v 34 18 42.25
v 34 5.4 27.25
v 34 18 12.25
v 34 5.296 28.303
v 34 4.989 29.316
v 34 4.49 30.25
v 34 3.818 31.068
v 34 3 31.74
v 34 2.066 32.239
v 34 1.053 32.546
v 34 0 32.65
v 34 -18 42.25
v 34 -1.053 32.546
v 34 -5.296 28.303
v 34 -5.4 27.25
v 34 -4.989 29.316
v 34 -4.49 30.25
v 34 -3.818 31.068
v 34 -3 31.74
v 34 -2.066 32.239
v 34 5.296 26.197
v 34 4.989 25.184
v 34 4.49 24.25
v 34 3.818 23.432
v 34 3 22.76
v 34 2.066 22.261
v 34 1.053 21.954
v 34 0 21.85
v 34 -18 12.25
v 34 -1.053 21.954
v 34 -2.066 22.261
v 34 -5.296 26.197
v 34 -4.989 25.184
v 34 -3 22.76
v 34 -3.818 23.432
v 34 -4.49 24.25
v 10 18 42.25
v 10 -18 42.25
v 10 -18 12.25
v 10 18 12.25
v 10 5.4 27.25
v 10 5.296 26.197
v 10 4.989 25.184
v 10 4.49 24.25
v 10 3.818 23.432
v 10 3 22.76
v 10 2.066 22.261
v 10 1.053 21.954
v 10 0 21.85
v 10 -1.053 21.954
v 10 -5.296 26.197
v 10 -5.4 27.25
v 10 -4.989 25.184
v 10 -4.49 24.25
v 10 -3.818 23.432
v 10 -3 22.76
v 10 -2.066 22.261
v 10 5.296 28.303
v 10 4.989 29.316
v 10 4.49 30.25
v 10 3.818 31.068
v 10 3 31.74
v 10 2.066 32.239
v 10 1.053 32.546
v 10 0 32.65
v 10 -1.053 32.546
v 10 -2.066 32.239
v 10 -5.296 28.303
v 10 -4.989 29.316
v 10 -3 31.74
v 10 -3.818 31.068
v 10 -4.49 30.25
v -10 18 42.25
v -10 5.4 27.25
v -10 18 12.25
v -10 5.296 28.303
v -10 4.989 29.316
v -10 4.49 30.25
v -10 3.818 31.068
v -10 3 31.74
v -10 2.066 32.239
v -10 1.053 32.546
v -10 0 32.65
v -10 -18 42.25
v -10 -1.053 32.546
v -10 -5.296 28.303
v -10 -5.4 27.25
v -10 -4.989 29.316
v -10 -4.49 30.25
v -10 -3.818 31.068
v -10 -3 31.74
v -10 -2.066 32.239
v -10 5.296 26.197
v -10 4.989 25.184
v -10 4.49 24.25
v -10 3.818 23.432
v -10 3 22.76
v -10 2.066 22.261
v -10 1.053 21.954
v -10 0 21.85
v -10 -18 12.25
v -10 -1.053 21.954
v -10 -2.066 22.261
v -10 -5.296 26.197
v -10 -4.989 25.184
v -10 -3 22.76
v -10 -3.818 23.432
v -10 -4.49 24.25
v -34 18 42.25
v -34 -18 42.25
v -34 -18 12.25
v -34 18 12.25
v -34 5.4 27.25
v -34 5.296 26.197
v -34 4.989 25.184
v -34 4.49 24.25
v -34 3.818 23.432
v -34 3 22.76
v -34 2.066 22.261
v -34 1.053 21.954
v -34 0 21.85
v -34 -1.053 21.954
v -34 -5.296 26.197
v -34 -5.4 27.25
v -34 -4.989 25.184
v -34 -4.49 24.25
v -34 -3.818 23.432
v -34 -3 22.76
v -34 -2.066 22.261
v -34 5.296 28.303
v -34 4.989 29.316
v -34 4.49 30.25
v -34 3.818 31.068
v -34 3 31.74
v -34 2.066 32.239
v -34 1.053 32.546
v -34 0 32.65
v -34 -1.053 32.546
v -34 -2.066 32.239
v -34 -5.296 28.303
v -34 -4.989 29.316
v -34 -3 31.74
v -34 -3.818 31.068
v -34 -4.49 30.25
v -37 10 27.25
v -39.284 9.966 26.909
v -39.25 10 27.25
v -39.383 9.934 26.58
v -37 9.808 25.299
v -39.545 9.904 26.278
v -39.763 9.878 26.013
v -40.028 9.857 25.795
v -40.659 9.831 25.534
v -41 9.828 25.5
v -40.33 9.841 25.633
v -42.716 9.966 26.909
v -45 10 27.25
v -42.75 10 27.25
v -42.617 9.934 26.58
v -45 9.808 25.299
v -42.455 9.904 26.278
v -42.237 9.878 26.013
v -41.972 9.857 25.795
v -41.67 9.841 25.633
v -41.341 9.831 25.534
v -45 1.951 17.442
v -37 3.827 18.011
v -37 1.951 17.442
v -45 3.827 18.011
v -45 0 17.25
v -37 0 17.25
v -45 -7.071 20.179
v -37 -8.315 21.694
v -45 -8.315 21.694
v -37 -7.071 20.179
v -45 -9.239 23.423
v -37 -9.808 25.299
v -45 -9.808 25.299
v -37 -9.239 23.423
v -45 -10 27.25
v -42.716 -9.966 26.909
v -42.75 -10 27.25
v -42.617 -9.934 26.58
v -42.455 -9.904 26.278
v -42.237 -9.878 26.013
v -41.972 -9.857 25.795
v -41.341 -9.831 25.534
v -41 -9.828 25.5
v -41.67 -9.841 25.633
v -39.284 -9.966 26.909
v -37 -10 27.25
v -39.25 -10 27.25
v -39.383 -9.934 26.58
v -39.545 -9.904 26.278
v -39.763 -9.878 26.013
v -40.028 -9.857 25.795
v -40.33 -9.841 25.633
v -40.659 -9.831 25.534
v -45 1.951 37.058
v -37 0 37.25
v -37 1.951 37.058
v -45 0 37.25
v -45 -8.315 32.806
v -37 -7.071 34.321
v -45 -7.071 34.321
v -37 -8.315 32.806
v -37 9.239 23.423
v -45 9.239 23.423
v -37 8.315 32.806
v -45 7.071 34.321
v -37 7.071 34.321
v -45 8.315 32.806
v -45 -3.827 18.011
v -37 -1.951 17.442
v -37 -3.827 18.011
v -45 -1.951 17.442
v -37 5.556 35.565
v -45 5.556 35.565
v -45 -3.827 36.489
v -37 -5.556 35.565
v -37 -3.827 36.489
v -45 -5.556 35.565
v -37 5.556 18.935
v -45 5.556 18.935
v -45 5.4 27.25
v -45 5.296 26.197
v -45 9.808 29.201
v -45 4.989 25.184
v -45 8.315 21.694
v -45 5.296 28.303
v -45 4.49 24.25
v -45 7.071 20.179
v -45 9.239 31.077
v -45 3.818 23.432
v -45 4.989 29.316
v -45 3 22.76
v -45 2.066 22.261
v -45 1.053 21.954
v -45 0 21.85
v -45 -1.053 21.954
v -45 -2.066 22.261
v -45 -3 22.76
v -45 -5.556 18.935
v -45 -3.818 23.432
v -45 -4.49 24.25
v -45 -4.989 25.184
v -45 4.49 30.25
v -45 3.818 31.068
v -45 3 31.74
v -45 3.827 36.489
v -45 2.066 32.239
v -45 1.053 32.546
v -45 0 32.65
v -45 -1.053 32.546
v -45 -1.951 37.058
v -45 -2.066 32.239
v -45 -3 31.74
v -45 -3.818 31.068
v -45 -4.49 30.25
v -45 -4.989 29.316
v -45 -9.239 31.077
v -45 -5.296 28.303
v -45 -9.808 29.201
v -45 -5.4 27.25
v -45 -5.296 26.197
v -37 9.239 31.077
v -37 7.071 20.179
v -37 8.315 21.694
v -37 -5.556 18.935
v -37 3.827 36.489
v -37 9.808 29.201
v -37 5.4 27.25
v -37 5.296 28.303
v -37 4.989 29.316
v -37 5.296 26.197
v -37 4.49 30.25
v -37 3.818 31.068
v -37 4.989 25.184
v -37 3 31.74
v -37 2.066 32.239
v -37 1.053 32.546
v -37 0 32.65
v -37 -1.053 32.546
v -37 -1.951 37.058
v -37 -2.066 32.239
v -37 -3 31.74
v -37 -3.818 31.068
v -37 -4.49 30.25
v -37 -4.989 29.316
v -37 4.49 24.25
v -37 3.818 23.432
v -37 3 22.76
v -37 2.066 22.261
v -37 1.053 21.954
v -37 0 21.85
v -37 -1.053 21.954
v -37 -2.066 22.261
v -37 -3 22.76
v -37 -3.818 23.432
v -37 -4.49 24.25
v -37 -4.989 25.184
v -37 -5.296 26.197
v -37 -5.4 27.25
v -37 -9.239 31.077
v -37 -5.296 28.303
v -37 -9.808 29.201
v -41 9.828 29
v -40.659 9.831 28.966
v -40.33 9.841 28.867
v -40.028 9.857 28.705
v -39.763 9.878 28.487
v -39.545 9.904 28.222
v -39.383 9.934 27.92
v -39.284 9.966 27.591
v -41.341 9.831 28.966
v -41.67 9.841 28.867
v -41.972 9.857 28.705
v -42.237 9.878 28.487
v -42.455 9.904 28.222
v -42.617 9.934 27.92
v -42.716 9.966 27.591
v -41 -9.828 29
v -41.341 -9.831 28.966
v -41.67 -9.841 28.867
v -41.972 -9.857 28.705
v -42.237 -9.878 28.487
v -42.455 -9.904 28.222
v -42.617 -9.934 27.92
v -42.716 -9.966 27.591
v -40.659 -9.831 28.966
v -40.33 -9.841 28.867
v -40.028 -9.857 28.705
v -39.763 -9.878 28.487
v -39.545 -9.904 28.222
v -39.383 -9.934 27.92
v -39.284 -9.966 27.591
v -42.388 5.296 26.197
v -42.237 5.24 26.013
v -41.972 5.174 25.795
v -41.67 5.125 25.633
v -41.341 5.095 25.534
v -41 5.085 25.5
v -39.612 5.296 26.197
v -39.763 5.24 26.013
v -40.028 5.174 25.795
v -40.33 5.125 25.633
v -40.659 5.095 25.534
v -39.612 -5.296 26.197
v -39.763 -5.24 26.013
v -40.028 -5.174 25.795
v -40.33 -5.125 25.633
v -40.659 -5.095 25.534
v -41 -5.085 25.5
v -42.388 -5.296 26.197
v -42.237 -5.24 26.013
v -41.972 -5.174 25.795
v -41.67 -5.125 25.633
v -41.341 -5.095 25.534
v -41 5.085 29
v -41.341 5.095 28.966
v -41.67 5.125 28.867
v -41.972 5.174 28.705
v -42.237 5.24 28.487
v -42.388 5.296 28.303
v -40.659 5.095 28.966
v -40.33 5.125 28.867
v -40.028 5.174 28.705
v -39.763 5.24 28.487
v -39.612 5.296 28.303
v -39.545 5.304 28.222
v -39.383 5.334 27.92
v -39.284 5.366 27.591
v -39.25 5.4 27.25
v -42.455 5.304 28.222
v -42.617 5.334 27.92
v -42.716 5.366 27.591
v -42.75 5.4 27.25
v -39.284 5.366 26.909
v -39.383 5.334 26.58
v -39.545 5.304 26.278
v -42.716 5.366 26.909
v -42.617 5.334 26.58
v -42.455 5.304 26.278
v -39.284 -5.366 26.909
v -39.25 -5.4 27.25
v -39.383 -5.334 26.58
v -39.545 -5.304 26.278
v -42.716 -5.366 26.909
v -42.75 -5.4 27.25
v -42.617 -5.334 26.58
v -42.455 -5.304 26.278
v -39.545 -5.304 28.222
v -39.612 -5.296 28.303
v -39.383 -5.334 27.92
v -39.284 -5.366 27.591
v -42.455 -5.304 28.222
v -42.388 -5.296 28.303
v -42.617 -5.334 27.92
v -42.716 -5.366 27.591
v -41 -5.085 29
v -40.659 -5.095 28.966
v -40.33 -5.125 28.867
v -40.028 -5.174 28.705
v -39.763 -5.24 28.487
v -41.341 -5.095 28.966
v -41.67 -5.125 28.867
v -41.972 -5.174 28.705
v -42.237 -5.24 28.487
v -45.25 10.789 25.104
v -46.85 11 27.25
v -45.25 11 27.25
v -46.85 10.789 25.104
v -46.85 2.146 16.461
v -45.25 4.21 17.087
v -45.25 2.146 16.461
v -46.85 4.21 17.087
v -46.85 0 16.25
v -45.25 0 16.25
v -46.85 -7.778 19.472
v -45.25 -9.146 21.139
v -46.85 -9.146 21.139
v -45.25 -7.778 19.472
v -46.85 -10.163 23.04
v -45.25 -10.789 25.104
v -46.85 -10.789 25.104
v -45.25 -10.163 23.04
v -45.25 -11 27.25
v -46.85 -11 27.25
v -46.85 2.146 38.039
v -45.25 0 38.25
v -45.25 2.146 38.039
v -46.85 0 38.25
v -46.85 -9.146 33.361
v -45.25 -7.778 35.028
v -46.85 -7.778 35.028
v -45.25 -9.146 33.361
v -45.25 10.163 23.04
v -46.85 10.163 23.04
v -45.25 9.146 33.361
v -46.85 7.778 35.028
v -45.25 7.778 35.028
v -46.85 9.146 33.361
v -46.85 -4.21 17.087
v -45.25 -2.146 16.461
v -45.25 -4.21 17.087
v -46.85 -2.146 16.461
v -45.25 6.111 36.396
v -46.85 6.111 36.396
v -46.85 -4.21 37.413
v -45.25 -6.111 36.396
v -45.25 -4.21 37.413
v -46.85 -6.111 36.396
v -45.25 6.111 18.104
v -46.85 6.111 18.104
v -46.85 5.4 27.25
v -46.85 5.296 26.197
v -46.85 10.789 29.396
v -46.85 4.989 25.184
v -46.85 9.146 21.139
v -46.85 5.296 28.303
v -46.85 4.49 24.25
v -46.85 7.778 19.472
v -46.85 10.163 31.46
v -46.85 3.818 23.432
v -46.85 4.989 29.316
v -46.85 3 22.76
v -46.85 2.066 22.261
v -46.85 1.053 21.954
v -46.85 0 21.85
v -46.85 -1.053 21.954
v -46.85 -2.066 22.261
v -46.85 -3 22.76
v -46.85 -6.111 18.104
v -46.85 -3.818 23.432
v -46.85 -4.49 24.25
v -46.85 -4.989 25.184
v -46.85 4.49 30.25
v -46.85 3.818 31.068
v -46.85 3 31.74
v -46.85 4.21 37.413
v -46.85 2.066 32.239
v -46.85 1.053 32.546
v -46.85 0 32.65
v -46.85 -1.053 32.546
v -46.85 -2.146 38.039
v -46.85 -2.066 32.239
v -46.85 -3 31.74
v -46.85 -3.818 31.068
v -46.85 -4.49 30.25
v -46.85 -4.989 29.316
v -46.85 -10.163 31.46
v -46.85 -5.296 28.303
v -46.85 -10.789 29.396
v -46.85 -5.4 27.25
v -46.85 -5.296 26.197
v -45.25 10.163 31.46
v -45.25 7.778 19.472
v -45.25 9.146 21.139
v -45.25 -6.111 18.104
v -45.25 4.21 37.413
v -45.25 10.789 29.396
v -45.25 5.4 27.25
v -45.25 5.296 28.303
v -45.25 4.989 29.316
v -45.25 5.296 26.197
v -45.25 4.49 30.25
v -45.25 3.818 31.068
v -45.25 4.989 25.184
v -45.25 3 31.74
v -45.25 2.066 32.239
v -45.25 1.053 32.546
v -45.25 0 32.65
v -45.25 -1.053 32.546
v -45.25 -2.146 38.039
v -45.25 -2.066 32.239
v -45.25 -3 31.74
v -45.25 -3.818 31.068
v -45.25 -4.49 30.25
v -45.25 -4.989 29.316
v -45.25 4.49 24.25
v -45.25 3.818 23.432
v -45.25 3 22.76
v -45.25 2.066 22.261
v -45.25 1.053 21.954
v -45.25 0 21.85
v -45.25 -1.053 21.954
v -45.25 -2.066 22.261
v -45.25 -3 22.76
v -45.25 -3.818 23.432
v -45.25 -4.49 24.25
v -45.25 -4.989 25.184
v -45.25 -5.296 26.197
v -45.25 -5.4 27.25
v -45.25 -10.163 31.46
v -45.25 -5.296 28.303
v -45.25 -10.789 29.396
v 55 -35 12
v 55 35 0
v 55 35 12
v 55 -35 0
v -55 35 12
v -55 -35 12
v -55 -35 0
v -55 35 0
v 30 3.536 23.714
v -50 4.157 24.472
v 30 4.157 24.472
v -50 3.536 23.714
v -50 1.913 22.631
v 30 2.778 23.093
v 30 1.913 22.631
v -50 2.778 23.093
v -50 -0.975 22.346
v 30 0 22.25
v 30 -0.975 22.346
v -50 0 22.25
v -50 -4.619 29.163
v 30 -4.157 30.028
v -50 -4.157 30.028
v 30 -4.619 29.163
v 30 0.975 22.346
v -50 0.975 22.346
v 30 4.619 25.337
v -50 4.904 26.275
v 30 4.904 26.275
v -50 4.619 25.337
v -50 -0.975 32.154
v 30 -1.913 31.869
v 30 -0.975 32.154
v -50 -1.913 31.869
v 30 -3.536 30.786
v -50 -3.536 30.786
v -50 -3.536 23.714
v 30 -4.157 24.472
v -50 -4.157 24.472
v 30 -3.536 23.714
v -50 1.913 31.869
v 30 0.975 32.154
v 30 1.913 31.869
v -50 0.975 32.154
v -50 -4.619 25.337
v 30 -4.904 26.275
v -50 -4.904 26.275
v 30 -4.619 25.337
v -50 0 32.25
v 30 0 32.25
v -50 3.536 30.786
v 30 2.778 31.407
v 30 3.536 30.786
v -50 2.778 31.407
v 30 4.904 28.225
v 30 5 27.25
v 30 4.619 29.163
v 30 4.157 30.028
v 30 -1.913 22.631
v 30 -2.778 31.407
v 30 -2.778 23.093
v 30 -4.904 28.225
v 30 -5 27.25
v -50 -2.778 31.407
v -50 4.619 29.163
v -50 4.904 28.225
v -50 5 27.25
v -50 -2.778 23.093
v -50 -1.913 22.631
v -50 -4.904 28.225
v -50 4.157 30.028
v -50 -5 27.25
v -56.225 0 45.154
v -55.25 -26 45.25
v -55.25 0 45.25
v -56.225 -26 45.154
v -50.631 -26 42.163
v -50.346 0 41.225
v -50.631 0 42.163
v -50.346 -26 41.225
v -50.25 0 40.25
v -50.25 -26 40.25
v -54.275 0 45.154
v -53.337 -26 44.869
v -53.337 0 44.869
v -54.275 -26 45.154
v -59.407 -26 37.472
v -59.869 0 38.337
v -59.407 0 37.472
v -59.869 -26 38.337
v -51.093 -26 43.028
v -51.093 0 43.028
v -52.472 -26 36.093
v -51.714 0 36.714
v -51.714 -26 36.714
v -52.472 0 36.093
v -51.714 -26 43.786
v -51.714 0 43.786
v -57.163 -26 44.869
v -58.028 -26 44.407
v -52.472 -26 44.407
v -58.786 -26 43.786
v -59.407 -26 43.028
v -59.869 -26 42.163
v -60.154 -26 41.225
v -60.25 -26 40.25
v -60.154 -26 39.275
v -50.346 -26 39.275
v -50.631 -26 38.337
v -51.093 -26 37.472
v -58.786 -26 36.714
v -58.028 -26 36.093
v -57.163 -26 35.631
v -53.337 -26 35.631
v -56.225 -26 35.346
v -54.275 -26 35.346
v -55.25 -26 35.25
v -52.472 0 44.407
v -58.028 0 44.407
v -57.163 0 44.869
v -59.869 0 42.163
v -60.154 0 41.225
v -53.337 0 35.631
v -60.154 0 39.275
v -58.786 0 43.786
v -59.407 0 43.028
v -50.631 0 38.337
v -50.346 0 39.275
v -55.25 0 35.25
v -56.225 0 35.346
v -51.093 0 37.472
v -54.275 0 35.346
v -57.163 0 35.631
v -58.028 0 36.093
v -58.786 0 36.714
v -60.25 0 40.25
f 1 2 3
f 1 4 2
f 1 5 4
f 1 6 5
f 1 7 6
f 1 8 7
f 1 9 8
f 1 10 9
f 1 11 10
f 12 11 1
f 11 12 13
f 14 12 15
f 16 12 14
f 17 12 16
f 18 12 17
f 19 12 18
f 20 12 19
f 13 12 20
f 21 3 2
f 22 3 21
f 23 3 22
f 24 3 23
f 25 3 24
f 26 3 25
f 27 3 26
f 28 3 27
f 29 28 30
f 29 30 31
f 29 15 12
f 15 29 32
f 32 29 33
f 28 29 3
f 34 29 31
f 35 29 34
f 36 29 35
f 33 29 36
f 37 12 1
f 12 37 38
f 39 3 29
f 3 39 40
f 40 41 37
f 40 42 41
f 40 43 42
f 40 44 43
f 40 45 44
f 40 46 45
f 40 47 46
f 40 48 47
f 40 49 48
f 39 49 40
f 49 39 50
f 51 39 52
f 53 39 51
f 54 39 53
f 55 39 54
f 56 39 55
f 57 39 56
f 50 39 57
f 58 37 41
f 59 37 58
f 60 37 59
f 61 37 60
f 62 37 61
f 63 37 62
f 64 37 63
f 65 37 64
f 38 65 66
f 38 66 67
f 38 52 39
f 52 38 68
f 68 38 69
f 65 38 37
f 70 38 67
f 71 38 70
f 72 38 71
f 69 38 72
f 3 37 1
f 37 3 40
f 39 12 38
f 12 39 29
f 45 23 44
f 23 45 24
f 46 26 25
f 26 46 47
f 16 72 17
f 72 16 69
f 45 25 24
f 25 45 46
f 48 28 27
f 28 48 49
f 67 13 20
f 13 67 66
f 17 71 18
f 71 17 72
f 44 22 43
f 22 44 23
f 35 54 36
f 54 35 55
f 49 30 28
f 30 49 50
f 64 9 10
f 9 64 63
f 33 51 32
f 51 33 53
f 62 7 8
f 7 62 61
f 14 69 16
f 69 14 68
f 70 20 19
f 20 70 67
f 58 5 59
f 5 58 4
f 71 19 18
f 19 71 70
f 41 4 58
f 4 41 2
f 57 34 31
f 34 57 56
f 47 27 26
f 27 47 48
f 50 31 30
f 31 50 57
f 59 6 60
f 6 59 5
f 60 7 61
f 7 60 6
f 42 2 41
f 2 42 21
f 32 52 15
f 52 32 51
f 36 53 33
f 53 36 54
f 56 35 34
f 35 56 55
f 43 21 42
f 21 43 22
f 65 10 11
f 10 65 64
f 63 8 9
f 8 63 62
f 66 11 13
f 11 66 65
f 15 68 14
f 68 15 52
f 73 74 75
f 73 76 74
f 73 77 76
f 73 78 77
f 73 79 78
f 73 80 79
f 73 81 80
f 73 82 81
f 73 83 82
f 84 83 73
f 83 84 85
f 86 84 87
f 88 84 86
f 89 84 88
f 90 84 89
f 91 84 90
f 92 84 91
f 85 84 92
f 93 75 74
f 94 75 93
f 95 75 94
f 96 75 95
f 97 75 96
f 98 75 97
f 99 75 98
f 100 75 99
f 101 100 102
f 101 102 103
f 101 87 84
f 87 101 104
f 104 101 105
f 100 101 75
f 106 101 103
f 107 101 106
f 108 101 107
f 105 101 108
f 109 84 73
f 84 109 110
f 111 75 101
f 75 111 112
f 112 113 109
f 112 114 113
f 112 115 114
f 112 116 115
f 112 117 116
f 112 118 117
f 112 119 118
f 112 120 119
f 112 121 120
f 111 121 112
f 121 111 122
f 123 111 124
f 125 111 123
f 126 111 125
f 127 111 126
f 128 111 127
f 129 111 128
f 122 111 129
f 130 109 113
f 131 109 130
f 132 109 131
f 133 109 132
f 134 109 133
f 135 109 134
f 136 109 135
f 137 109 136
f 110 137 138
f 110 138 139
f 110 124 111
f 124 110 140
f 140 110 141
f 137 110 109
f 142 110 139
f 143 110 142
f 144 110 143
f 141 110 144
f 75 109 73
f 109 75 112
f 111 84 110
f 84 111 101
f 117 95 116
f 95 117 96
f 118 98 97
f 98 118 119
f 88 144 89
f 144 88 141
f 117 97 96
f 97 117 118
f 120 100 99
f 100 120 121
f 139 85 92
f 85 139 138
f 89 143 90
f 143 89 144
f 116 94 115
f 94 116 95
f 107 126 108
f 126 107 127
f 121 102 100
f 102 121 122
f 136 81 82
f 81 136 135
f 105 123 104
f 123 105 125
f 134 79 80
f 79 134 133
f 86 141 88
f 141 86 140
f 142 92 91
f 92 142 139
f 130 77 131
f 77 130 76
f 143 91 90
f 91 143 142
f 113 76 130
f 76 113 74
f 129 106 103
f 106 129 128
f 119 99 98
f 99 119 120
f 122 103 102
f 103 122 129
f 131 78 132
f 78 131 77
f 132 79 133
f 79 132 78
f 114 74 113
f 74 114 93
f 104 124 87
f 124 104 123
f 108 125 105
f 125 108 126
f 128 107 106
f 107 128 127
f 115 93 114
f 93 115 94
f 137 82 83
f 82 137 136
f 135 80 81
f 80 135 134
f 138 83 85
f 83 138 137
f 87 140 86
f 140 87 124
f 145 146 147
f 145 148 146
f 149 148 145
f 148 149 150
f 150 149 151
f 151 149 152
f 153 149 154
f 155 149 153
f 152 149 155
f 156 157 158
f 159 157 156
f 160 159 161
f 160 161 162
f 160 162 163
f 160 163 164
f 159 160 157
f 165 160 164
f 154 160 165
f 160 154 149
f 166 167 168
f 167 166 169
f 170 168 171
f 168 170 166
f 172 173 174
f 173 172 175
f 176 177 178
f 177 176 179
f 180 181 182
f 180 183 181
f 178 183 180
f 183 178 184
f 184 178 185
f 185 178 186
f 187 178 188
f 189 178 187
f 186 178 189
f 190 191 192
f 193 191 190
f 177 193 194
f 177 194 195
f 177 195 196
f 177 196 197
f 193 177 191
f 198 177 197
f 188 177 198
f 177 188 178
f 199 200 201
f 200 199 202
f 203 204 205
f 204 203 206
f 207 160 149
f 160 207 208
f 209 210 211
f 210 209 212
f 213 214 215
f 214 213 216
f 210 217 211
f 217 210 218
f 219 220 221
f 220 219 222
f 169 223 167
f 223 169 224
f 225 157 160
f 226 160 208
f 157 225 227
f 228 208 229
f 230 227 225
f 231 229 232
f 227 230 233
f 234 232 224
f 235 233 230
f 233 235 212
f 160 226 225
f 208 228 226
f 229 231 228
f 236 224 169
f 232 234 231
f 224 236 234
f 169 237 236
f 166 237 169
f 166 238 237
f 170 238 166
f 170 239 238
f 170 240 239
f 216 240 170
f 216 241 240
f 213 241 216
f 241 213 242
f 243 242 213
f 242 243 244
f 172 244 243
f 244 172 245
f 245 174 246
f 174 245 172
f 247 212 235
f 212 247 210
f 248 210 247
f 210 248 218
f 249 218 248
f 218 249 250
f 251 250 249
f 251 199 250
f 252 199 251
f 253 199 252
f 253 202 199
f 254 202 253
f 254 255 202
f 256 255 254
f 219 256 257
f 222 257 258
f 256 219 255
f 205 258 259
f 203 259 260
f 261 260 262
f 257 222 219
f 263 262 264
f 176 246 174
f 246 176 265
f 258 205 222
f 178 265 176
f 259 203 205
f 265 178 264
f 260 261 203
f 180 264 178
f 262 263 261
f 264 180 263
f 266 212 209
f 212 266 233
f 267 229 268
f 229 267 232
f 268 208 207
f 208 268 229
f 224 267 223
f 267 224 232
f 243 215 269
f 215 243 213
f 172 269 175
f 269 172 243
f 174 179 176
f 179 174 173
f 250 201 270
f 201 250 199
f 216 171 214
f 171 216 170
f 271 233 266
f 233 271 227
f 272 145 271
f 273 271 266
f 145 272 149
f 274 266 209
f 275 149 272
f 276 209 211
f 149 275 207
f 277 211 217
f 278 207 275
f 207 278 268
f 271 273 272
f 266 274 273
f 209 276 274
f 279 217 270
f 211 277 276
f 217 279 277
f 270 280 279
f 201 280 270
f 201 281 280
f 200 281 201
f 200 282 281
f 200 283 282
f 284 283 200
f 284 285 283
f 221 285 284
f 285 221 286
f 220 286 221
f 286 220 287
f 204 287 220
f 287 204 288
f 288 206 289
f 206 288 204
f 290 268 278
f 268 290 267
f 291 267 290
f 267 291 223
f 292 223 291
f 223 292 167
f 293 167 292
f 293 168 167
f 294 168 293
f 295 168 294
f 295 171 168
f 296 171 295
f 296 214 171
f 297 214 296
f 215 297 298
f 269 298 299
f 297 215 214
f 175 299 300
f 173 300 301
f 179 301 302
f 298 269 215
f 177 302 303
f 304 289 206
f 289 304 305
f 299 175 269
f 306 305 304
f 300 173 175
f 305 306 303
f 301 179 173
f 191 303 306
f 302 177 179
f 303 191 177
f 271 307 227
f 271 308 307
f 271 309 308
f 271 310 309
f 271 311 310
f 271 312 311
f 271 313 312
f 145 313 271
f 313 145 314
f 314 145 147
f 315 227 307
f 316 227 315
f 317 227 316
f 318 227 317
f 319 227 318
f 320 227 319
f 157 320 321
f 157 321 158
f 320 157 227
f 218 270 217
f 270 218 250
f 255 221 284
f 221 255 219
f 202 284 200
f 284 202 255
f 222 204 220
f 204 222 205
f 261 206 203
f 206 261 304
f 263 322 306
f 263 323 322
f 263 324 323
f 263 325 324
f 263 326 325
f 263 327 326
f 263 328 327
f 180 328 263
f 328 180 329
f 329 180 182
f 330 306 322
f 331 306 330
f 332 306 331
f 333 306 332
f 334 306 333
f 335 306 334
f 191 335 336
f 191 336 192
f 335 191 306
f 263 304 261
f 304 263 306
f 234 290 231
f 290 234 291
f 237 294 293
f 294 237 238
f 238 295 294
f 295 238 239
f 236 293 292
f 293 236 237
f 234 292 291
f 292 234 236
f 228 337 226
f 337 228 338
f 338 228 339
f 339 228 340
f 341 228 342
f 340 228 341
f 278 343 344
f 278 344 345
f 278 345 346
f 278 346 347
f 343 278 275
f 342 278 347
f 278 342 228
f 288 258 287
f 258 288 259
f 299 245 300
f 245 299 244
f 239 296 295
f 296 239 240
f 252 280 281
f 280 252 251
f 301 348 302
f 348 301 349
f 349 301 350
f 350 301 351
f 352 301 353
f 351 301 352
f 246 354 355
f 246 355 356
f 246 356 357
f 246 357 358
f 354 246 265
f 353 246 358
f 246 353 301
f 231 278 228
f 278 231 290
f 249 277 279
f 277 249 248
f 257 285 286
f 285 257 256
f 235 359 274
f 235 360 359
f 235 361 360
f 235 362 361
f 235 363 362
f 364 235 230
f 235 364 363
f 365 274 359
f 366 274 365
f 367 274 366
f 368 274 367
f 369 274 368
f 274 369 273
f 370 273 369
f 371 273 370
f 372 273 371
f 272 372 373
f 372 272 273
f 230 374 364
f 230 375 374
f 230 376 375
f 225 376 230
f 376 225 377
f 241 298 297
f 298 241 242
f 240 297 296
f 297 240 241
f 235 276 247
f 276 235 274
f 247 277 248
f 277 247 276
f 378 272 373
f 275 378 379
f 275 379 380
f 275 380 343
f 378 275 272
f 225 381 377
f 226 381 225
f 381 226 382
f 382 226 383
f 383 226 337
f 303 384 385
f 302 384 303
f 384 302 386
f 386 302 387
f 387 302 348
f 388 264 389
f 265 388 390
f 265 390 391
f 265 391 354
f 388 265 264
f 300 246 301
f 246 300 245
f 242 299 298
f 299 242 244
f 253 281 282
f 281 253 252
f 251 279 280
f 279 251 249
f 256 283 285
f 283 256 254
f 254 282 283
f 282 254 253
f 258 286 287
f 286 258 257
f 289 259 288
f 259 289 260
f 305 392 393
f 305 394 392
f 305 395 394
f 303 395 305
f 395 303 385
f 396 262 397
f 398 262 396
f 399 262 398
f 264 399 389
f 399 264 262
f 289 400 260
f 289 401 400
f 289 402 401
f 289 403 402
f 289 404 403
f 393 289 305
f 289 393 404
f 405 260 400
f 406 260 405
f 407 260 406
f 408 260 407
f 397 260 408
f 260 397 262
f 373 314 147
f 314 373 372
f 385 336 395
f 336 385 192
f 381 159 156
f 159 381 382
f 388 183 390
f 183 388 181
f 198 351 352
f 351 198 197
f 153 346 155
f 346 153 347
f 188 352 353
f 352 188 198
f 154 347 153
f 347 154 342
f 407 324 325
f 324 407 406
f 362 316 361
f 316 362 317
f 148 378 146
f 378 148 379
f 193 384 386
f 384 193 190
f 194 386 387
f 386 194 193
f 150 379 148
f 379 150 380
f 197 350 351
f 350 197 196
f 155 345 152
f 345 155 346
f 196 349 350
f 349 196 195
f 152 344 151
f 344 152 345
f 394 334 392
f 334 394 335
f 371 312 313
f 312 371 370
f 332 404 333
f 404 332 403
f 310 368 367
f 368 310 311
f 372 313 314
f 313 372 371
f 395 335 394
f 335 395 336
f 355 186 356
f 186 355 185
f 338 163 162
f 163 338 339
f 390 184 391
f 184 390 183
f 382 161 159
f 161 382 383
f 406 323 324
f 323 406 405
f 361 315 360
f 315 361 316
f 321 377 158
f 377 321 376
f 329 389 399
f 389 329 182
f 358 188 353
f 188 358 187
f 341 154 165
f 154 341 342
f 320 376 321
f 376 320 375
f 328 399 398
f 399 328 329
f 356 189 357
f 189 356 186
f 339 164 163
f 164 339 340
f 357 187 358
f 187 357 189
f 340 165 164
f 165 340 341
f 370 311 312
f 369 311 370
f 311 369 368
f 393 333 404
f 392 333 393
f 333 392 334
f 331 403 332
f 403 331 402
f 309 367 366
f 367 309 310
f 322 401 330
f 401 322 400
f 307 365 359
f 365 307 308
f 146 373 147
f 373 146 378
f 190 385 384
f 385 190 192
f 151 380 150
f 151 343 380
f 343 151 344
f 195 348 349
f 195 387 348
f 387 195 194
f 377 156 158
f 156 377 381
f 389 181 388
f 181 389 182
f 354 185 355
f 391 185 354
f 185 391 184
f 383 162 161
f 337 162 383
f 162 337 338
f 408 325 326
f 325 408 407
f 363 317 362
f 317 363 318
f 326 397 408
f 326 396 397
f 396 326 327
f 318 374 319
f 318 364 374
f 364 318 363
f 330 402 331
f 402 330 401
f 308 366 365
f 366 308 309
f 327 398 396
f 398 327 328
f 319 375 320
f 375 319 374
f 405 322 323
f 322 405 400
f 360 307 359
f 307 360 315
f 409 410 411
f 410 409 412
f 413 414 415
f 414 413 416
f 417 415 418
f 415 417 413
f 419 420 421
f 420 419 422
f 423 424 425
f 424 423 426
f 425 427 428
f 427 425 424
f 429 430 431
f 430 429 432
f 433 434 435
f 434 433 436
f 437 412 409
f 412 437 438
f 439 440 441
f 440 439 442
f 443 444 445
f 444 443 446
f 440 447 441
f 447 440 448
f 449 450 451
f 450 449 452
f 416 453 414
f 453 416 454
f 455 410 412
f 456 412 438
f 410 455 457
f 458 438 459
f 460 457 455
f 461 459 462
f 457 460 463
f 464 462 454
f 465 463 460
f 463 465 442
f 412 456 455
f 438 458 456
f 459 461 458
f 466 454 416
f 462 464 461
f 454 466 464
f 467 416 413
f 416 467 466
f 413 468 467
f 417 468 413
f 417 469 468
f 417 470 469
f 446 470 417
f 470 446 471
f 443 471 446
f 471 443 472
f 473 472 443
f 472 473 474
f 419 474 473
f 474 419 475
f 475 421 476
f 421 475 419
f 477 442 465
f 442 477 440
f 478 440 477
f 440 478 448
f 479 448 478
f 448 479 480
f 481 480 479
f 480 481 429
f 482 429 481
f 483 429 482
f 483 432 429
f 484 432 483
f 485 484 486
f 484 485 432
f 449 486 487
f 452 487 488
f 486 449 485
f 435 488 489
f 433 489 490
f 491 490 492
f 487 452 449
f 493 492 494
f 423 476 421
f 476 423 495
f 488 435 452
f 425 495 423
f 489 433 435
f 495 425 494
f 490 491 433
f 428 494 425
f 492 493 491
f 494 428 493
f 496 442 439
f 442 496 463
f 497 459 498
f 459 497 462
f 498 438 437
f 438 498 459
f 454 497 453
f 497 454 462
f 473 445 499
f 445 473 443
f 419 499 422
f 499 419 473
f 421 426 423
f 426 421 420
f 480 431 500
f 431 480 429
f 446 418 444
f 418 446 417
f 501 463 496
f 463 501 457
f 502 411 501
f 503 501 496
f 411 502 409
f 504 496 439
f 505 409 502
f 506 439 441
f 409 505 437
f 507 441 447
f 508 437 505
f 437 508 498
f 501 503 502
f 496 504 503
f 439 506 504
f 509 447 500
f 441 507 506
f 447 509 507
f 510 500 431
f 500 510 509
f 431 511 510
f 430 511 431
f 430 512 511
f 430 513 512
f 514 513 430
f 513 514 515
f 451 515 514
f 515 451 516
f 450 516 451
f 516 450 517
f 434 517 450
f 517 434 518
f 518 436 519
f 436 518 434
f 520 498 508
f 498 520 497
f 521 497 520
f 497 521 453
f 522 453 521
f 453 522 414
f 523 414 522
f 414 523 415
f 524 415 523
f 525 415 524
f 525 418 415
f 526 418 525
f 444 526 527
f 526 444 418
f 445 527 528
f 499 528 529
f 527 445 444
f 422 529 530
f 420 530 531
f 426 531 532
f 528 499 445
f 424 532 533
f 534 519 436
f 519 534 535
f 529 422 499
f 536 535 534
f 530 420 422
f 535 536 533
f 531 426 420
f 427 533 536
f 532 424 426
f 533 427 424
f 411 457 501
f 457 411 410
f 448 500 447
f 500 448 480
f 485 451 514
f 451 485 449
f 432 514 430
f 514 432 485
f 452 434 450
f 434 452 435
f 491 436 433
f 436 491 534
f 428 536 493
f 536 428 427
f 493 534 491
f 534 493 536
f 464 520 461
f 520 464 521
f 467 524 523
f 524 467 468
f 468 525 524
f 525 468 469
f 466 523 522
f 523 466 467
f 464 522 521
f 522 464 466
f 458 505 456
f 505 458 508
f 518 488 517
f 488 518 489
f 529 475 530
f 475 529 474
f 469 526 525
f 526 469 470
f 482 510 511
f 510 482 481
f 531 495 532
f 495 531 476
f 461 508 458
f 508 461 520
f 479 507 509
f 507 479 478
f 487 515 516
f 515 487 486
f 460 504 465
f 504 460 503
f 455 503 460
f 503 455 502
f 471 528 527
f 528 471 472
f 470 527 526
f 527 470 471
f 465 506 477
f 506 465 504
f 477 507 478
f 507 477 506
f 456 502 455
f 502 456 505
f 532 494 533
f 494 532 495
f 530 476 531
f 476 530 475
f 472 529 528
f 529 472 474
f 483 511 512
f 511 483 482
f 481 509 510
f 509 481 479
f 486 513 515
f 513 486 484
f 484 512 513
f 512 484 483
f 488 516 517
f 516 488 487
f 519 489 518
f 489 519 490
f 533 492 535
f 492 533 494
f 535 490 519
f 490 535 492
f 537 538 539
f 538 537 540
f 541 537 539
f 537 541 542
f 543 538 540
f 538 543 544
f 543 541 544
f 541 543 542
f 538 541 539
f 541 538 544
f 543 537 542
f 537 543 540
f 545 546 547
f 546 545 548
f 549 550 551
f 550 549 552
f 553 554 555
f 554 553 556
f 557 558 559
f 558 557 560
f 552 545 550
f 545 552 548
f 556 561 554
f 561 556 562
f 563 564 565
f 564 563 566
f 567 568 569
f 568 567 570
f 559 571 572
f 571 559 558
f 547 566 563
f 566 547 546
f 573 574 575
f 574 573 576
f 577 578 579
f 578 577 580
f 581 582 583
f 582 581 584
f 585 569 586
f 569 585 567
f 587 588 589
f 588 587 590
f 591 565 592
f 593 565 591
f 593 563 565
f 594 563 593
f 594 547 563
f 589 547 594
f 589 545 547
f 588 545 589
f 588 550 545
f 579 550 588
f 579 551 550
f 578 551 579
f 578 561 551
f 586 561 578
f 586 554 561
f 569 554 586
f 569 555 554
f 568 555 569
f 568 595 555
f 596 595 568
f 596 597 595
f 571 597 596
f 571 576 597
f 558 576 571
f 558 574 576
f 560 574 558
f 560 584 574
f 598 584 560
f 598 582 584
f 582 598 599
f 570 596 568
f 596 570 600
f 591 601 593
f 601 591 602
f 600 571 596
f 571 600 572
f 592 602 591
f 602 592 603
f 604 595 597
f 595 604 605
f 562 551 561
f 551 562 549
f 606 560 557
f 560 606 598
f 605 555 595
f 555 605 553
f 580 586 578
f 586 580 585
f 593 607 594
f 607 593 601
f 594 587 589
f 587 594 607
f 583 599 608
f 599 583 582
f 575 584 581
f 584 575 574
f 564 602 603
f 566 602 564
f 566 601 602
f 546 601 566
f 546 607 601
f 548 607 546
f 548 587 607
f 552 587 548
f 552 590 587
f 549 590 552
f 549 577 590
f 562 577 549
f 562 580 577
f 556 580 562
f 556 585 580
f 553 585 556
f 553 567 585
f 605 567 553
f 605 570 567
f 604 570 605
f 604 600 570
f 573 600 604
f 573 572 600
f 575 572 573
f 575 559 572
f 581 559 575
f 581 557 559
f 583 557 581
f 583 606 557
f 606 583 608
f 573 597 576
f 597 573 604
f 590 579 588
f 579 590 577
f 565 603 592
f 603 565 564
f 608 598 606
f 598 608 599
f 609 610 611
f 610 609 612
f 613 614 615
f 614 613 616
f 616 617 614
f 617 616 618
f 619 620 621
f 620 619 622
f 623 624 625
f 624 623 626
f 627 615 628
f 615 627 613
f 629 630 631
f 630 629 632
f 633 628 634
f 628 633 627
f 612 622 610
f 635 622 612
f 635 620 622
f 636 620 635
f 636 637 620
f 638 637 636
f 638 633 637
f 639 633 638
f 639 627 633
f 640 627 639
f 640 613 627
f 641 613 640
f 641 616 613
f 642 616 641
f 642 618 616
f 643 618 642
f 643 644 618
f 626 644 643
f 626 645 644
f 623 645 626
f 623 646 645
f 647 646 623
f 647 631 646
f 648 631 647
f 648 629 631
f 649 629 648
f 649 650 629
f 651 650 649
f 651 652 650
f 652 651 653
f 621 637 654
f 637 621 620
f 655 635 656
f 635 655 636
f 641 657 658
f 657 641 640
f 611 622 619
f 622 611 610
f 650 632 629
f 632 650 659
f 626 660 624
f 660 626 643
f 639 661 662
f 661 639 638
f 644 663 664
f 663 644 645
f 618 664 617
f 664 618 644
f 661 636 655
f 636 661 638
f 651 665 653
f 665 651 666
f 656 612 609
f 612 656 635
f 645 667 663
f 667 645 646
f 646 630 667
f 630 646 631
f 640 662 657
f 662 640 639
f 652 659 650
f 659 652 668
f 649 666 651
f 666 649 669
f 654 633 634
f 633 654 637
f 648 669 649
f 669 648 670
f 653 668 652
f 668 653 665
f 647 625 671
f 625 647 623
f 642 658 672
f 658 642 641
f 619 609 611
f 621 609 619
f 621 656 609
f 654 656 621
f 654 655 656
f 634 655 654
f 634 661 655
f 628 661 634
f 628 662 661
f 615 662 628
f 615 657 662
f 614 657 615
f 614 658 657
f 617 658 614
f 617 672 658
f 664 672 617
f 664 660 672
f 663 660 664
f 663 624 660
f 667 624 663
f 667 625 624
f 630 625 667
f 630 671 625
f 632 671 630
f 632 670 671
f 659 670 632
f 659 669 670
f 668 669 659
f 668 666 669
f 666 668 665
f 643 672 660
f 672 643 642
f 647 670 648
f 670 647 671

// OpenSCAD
$fn = 32;

// ------------------------------------------------------------------------
// Machine vise: screw d10, jaws 24 x 30 mm
// Every part is its own module, assembly() places every instance.
// ------------------------------------------------------------------------

// --- part 1 ---
module vise_bed() {
  difference() {
    translate([-55, -35, 0]) cube([110, 70, 12]);
  }
}

// --- part 2 ---
module vise_jaw() {
  difference() {
    translate([-12, -18, 0]) cube([24, 36, 30]);
    translate([0, 0, 15]) rotate([0, 90, 0]) cylinder(h = 26, d = 10.8, center = true);
  }
}

// --- part 3 ---
module vise_screw() {
  translate([0, 0, -40]) cylinder(h = 80, d = 10);
}

// --- part 4 ---
module screw_collar() {
  difference() {
    cylinder(h = 8, d = 20);
    translate([0, 0, -1]) cylinder(h = 10, d = 10.8);
    translate([0, 0, 4]) rotate([90, 0, 0]) cylinder(h = 22, d = 3.5, center = true);
  }
}

// --- part 5 ---
module screw_washer() {
  difference() {
      translate([0, 0, 0]) cylinder(h = 1.6, d = 22);
      translate([0, 0, -1]) cylinder(h = 3.6, d = 10.8);
    }
}

// --- part 6 ---
module vise_handle() {
  cylinder(h = 26, d = 10);
}

// --- assembly ---
module assembly() {
  color([0.80, 0.24, 0.20]) translate([0, 0, 0]) rotate([0, 0, 0]) vise_bed();
  color([0.20, 0.45, 0.75]) translate([22, 0, 12.25]) rotate([0, 0, 0]) vise_jaw();
  color([0.25, 0.62, 0.32]) translate([-22, 0, 12.25]) rotate([0, 0, 0]) vise_jaw();
  color([0.92, 0.70, 0.18]) translate([-10, 0, 27.25]) rotate([0, 90, 0]) vise_screw();
  color([0.58, 0.35, 0.70]) translate([-45, 0, 27.25]) rotate([0, 90, 0]) screw_collar();
  color([0.16, 0.66, 0.66]) translate([-46.85, 0, 27.25]) rotate([0, 90, 0]) screw_washer();
  color([0.85, 0.48, 0.18]) translate([-55.25, 0, 40.25]) rotate([90, 0, 0]) vise_handle();
}

assembly();
